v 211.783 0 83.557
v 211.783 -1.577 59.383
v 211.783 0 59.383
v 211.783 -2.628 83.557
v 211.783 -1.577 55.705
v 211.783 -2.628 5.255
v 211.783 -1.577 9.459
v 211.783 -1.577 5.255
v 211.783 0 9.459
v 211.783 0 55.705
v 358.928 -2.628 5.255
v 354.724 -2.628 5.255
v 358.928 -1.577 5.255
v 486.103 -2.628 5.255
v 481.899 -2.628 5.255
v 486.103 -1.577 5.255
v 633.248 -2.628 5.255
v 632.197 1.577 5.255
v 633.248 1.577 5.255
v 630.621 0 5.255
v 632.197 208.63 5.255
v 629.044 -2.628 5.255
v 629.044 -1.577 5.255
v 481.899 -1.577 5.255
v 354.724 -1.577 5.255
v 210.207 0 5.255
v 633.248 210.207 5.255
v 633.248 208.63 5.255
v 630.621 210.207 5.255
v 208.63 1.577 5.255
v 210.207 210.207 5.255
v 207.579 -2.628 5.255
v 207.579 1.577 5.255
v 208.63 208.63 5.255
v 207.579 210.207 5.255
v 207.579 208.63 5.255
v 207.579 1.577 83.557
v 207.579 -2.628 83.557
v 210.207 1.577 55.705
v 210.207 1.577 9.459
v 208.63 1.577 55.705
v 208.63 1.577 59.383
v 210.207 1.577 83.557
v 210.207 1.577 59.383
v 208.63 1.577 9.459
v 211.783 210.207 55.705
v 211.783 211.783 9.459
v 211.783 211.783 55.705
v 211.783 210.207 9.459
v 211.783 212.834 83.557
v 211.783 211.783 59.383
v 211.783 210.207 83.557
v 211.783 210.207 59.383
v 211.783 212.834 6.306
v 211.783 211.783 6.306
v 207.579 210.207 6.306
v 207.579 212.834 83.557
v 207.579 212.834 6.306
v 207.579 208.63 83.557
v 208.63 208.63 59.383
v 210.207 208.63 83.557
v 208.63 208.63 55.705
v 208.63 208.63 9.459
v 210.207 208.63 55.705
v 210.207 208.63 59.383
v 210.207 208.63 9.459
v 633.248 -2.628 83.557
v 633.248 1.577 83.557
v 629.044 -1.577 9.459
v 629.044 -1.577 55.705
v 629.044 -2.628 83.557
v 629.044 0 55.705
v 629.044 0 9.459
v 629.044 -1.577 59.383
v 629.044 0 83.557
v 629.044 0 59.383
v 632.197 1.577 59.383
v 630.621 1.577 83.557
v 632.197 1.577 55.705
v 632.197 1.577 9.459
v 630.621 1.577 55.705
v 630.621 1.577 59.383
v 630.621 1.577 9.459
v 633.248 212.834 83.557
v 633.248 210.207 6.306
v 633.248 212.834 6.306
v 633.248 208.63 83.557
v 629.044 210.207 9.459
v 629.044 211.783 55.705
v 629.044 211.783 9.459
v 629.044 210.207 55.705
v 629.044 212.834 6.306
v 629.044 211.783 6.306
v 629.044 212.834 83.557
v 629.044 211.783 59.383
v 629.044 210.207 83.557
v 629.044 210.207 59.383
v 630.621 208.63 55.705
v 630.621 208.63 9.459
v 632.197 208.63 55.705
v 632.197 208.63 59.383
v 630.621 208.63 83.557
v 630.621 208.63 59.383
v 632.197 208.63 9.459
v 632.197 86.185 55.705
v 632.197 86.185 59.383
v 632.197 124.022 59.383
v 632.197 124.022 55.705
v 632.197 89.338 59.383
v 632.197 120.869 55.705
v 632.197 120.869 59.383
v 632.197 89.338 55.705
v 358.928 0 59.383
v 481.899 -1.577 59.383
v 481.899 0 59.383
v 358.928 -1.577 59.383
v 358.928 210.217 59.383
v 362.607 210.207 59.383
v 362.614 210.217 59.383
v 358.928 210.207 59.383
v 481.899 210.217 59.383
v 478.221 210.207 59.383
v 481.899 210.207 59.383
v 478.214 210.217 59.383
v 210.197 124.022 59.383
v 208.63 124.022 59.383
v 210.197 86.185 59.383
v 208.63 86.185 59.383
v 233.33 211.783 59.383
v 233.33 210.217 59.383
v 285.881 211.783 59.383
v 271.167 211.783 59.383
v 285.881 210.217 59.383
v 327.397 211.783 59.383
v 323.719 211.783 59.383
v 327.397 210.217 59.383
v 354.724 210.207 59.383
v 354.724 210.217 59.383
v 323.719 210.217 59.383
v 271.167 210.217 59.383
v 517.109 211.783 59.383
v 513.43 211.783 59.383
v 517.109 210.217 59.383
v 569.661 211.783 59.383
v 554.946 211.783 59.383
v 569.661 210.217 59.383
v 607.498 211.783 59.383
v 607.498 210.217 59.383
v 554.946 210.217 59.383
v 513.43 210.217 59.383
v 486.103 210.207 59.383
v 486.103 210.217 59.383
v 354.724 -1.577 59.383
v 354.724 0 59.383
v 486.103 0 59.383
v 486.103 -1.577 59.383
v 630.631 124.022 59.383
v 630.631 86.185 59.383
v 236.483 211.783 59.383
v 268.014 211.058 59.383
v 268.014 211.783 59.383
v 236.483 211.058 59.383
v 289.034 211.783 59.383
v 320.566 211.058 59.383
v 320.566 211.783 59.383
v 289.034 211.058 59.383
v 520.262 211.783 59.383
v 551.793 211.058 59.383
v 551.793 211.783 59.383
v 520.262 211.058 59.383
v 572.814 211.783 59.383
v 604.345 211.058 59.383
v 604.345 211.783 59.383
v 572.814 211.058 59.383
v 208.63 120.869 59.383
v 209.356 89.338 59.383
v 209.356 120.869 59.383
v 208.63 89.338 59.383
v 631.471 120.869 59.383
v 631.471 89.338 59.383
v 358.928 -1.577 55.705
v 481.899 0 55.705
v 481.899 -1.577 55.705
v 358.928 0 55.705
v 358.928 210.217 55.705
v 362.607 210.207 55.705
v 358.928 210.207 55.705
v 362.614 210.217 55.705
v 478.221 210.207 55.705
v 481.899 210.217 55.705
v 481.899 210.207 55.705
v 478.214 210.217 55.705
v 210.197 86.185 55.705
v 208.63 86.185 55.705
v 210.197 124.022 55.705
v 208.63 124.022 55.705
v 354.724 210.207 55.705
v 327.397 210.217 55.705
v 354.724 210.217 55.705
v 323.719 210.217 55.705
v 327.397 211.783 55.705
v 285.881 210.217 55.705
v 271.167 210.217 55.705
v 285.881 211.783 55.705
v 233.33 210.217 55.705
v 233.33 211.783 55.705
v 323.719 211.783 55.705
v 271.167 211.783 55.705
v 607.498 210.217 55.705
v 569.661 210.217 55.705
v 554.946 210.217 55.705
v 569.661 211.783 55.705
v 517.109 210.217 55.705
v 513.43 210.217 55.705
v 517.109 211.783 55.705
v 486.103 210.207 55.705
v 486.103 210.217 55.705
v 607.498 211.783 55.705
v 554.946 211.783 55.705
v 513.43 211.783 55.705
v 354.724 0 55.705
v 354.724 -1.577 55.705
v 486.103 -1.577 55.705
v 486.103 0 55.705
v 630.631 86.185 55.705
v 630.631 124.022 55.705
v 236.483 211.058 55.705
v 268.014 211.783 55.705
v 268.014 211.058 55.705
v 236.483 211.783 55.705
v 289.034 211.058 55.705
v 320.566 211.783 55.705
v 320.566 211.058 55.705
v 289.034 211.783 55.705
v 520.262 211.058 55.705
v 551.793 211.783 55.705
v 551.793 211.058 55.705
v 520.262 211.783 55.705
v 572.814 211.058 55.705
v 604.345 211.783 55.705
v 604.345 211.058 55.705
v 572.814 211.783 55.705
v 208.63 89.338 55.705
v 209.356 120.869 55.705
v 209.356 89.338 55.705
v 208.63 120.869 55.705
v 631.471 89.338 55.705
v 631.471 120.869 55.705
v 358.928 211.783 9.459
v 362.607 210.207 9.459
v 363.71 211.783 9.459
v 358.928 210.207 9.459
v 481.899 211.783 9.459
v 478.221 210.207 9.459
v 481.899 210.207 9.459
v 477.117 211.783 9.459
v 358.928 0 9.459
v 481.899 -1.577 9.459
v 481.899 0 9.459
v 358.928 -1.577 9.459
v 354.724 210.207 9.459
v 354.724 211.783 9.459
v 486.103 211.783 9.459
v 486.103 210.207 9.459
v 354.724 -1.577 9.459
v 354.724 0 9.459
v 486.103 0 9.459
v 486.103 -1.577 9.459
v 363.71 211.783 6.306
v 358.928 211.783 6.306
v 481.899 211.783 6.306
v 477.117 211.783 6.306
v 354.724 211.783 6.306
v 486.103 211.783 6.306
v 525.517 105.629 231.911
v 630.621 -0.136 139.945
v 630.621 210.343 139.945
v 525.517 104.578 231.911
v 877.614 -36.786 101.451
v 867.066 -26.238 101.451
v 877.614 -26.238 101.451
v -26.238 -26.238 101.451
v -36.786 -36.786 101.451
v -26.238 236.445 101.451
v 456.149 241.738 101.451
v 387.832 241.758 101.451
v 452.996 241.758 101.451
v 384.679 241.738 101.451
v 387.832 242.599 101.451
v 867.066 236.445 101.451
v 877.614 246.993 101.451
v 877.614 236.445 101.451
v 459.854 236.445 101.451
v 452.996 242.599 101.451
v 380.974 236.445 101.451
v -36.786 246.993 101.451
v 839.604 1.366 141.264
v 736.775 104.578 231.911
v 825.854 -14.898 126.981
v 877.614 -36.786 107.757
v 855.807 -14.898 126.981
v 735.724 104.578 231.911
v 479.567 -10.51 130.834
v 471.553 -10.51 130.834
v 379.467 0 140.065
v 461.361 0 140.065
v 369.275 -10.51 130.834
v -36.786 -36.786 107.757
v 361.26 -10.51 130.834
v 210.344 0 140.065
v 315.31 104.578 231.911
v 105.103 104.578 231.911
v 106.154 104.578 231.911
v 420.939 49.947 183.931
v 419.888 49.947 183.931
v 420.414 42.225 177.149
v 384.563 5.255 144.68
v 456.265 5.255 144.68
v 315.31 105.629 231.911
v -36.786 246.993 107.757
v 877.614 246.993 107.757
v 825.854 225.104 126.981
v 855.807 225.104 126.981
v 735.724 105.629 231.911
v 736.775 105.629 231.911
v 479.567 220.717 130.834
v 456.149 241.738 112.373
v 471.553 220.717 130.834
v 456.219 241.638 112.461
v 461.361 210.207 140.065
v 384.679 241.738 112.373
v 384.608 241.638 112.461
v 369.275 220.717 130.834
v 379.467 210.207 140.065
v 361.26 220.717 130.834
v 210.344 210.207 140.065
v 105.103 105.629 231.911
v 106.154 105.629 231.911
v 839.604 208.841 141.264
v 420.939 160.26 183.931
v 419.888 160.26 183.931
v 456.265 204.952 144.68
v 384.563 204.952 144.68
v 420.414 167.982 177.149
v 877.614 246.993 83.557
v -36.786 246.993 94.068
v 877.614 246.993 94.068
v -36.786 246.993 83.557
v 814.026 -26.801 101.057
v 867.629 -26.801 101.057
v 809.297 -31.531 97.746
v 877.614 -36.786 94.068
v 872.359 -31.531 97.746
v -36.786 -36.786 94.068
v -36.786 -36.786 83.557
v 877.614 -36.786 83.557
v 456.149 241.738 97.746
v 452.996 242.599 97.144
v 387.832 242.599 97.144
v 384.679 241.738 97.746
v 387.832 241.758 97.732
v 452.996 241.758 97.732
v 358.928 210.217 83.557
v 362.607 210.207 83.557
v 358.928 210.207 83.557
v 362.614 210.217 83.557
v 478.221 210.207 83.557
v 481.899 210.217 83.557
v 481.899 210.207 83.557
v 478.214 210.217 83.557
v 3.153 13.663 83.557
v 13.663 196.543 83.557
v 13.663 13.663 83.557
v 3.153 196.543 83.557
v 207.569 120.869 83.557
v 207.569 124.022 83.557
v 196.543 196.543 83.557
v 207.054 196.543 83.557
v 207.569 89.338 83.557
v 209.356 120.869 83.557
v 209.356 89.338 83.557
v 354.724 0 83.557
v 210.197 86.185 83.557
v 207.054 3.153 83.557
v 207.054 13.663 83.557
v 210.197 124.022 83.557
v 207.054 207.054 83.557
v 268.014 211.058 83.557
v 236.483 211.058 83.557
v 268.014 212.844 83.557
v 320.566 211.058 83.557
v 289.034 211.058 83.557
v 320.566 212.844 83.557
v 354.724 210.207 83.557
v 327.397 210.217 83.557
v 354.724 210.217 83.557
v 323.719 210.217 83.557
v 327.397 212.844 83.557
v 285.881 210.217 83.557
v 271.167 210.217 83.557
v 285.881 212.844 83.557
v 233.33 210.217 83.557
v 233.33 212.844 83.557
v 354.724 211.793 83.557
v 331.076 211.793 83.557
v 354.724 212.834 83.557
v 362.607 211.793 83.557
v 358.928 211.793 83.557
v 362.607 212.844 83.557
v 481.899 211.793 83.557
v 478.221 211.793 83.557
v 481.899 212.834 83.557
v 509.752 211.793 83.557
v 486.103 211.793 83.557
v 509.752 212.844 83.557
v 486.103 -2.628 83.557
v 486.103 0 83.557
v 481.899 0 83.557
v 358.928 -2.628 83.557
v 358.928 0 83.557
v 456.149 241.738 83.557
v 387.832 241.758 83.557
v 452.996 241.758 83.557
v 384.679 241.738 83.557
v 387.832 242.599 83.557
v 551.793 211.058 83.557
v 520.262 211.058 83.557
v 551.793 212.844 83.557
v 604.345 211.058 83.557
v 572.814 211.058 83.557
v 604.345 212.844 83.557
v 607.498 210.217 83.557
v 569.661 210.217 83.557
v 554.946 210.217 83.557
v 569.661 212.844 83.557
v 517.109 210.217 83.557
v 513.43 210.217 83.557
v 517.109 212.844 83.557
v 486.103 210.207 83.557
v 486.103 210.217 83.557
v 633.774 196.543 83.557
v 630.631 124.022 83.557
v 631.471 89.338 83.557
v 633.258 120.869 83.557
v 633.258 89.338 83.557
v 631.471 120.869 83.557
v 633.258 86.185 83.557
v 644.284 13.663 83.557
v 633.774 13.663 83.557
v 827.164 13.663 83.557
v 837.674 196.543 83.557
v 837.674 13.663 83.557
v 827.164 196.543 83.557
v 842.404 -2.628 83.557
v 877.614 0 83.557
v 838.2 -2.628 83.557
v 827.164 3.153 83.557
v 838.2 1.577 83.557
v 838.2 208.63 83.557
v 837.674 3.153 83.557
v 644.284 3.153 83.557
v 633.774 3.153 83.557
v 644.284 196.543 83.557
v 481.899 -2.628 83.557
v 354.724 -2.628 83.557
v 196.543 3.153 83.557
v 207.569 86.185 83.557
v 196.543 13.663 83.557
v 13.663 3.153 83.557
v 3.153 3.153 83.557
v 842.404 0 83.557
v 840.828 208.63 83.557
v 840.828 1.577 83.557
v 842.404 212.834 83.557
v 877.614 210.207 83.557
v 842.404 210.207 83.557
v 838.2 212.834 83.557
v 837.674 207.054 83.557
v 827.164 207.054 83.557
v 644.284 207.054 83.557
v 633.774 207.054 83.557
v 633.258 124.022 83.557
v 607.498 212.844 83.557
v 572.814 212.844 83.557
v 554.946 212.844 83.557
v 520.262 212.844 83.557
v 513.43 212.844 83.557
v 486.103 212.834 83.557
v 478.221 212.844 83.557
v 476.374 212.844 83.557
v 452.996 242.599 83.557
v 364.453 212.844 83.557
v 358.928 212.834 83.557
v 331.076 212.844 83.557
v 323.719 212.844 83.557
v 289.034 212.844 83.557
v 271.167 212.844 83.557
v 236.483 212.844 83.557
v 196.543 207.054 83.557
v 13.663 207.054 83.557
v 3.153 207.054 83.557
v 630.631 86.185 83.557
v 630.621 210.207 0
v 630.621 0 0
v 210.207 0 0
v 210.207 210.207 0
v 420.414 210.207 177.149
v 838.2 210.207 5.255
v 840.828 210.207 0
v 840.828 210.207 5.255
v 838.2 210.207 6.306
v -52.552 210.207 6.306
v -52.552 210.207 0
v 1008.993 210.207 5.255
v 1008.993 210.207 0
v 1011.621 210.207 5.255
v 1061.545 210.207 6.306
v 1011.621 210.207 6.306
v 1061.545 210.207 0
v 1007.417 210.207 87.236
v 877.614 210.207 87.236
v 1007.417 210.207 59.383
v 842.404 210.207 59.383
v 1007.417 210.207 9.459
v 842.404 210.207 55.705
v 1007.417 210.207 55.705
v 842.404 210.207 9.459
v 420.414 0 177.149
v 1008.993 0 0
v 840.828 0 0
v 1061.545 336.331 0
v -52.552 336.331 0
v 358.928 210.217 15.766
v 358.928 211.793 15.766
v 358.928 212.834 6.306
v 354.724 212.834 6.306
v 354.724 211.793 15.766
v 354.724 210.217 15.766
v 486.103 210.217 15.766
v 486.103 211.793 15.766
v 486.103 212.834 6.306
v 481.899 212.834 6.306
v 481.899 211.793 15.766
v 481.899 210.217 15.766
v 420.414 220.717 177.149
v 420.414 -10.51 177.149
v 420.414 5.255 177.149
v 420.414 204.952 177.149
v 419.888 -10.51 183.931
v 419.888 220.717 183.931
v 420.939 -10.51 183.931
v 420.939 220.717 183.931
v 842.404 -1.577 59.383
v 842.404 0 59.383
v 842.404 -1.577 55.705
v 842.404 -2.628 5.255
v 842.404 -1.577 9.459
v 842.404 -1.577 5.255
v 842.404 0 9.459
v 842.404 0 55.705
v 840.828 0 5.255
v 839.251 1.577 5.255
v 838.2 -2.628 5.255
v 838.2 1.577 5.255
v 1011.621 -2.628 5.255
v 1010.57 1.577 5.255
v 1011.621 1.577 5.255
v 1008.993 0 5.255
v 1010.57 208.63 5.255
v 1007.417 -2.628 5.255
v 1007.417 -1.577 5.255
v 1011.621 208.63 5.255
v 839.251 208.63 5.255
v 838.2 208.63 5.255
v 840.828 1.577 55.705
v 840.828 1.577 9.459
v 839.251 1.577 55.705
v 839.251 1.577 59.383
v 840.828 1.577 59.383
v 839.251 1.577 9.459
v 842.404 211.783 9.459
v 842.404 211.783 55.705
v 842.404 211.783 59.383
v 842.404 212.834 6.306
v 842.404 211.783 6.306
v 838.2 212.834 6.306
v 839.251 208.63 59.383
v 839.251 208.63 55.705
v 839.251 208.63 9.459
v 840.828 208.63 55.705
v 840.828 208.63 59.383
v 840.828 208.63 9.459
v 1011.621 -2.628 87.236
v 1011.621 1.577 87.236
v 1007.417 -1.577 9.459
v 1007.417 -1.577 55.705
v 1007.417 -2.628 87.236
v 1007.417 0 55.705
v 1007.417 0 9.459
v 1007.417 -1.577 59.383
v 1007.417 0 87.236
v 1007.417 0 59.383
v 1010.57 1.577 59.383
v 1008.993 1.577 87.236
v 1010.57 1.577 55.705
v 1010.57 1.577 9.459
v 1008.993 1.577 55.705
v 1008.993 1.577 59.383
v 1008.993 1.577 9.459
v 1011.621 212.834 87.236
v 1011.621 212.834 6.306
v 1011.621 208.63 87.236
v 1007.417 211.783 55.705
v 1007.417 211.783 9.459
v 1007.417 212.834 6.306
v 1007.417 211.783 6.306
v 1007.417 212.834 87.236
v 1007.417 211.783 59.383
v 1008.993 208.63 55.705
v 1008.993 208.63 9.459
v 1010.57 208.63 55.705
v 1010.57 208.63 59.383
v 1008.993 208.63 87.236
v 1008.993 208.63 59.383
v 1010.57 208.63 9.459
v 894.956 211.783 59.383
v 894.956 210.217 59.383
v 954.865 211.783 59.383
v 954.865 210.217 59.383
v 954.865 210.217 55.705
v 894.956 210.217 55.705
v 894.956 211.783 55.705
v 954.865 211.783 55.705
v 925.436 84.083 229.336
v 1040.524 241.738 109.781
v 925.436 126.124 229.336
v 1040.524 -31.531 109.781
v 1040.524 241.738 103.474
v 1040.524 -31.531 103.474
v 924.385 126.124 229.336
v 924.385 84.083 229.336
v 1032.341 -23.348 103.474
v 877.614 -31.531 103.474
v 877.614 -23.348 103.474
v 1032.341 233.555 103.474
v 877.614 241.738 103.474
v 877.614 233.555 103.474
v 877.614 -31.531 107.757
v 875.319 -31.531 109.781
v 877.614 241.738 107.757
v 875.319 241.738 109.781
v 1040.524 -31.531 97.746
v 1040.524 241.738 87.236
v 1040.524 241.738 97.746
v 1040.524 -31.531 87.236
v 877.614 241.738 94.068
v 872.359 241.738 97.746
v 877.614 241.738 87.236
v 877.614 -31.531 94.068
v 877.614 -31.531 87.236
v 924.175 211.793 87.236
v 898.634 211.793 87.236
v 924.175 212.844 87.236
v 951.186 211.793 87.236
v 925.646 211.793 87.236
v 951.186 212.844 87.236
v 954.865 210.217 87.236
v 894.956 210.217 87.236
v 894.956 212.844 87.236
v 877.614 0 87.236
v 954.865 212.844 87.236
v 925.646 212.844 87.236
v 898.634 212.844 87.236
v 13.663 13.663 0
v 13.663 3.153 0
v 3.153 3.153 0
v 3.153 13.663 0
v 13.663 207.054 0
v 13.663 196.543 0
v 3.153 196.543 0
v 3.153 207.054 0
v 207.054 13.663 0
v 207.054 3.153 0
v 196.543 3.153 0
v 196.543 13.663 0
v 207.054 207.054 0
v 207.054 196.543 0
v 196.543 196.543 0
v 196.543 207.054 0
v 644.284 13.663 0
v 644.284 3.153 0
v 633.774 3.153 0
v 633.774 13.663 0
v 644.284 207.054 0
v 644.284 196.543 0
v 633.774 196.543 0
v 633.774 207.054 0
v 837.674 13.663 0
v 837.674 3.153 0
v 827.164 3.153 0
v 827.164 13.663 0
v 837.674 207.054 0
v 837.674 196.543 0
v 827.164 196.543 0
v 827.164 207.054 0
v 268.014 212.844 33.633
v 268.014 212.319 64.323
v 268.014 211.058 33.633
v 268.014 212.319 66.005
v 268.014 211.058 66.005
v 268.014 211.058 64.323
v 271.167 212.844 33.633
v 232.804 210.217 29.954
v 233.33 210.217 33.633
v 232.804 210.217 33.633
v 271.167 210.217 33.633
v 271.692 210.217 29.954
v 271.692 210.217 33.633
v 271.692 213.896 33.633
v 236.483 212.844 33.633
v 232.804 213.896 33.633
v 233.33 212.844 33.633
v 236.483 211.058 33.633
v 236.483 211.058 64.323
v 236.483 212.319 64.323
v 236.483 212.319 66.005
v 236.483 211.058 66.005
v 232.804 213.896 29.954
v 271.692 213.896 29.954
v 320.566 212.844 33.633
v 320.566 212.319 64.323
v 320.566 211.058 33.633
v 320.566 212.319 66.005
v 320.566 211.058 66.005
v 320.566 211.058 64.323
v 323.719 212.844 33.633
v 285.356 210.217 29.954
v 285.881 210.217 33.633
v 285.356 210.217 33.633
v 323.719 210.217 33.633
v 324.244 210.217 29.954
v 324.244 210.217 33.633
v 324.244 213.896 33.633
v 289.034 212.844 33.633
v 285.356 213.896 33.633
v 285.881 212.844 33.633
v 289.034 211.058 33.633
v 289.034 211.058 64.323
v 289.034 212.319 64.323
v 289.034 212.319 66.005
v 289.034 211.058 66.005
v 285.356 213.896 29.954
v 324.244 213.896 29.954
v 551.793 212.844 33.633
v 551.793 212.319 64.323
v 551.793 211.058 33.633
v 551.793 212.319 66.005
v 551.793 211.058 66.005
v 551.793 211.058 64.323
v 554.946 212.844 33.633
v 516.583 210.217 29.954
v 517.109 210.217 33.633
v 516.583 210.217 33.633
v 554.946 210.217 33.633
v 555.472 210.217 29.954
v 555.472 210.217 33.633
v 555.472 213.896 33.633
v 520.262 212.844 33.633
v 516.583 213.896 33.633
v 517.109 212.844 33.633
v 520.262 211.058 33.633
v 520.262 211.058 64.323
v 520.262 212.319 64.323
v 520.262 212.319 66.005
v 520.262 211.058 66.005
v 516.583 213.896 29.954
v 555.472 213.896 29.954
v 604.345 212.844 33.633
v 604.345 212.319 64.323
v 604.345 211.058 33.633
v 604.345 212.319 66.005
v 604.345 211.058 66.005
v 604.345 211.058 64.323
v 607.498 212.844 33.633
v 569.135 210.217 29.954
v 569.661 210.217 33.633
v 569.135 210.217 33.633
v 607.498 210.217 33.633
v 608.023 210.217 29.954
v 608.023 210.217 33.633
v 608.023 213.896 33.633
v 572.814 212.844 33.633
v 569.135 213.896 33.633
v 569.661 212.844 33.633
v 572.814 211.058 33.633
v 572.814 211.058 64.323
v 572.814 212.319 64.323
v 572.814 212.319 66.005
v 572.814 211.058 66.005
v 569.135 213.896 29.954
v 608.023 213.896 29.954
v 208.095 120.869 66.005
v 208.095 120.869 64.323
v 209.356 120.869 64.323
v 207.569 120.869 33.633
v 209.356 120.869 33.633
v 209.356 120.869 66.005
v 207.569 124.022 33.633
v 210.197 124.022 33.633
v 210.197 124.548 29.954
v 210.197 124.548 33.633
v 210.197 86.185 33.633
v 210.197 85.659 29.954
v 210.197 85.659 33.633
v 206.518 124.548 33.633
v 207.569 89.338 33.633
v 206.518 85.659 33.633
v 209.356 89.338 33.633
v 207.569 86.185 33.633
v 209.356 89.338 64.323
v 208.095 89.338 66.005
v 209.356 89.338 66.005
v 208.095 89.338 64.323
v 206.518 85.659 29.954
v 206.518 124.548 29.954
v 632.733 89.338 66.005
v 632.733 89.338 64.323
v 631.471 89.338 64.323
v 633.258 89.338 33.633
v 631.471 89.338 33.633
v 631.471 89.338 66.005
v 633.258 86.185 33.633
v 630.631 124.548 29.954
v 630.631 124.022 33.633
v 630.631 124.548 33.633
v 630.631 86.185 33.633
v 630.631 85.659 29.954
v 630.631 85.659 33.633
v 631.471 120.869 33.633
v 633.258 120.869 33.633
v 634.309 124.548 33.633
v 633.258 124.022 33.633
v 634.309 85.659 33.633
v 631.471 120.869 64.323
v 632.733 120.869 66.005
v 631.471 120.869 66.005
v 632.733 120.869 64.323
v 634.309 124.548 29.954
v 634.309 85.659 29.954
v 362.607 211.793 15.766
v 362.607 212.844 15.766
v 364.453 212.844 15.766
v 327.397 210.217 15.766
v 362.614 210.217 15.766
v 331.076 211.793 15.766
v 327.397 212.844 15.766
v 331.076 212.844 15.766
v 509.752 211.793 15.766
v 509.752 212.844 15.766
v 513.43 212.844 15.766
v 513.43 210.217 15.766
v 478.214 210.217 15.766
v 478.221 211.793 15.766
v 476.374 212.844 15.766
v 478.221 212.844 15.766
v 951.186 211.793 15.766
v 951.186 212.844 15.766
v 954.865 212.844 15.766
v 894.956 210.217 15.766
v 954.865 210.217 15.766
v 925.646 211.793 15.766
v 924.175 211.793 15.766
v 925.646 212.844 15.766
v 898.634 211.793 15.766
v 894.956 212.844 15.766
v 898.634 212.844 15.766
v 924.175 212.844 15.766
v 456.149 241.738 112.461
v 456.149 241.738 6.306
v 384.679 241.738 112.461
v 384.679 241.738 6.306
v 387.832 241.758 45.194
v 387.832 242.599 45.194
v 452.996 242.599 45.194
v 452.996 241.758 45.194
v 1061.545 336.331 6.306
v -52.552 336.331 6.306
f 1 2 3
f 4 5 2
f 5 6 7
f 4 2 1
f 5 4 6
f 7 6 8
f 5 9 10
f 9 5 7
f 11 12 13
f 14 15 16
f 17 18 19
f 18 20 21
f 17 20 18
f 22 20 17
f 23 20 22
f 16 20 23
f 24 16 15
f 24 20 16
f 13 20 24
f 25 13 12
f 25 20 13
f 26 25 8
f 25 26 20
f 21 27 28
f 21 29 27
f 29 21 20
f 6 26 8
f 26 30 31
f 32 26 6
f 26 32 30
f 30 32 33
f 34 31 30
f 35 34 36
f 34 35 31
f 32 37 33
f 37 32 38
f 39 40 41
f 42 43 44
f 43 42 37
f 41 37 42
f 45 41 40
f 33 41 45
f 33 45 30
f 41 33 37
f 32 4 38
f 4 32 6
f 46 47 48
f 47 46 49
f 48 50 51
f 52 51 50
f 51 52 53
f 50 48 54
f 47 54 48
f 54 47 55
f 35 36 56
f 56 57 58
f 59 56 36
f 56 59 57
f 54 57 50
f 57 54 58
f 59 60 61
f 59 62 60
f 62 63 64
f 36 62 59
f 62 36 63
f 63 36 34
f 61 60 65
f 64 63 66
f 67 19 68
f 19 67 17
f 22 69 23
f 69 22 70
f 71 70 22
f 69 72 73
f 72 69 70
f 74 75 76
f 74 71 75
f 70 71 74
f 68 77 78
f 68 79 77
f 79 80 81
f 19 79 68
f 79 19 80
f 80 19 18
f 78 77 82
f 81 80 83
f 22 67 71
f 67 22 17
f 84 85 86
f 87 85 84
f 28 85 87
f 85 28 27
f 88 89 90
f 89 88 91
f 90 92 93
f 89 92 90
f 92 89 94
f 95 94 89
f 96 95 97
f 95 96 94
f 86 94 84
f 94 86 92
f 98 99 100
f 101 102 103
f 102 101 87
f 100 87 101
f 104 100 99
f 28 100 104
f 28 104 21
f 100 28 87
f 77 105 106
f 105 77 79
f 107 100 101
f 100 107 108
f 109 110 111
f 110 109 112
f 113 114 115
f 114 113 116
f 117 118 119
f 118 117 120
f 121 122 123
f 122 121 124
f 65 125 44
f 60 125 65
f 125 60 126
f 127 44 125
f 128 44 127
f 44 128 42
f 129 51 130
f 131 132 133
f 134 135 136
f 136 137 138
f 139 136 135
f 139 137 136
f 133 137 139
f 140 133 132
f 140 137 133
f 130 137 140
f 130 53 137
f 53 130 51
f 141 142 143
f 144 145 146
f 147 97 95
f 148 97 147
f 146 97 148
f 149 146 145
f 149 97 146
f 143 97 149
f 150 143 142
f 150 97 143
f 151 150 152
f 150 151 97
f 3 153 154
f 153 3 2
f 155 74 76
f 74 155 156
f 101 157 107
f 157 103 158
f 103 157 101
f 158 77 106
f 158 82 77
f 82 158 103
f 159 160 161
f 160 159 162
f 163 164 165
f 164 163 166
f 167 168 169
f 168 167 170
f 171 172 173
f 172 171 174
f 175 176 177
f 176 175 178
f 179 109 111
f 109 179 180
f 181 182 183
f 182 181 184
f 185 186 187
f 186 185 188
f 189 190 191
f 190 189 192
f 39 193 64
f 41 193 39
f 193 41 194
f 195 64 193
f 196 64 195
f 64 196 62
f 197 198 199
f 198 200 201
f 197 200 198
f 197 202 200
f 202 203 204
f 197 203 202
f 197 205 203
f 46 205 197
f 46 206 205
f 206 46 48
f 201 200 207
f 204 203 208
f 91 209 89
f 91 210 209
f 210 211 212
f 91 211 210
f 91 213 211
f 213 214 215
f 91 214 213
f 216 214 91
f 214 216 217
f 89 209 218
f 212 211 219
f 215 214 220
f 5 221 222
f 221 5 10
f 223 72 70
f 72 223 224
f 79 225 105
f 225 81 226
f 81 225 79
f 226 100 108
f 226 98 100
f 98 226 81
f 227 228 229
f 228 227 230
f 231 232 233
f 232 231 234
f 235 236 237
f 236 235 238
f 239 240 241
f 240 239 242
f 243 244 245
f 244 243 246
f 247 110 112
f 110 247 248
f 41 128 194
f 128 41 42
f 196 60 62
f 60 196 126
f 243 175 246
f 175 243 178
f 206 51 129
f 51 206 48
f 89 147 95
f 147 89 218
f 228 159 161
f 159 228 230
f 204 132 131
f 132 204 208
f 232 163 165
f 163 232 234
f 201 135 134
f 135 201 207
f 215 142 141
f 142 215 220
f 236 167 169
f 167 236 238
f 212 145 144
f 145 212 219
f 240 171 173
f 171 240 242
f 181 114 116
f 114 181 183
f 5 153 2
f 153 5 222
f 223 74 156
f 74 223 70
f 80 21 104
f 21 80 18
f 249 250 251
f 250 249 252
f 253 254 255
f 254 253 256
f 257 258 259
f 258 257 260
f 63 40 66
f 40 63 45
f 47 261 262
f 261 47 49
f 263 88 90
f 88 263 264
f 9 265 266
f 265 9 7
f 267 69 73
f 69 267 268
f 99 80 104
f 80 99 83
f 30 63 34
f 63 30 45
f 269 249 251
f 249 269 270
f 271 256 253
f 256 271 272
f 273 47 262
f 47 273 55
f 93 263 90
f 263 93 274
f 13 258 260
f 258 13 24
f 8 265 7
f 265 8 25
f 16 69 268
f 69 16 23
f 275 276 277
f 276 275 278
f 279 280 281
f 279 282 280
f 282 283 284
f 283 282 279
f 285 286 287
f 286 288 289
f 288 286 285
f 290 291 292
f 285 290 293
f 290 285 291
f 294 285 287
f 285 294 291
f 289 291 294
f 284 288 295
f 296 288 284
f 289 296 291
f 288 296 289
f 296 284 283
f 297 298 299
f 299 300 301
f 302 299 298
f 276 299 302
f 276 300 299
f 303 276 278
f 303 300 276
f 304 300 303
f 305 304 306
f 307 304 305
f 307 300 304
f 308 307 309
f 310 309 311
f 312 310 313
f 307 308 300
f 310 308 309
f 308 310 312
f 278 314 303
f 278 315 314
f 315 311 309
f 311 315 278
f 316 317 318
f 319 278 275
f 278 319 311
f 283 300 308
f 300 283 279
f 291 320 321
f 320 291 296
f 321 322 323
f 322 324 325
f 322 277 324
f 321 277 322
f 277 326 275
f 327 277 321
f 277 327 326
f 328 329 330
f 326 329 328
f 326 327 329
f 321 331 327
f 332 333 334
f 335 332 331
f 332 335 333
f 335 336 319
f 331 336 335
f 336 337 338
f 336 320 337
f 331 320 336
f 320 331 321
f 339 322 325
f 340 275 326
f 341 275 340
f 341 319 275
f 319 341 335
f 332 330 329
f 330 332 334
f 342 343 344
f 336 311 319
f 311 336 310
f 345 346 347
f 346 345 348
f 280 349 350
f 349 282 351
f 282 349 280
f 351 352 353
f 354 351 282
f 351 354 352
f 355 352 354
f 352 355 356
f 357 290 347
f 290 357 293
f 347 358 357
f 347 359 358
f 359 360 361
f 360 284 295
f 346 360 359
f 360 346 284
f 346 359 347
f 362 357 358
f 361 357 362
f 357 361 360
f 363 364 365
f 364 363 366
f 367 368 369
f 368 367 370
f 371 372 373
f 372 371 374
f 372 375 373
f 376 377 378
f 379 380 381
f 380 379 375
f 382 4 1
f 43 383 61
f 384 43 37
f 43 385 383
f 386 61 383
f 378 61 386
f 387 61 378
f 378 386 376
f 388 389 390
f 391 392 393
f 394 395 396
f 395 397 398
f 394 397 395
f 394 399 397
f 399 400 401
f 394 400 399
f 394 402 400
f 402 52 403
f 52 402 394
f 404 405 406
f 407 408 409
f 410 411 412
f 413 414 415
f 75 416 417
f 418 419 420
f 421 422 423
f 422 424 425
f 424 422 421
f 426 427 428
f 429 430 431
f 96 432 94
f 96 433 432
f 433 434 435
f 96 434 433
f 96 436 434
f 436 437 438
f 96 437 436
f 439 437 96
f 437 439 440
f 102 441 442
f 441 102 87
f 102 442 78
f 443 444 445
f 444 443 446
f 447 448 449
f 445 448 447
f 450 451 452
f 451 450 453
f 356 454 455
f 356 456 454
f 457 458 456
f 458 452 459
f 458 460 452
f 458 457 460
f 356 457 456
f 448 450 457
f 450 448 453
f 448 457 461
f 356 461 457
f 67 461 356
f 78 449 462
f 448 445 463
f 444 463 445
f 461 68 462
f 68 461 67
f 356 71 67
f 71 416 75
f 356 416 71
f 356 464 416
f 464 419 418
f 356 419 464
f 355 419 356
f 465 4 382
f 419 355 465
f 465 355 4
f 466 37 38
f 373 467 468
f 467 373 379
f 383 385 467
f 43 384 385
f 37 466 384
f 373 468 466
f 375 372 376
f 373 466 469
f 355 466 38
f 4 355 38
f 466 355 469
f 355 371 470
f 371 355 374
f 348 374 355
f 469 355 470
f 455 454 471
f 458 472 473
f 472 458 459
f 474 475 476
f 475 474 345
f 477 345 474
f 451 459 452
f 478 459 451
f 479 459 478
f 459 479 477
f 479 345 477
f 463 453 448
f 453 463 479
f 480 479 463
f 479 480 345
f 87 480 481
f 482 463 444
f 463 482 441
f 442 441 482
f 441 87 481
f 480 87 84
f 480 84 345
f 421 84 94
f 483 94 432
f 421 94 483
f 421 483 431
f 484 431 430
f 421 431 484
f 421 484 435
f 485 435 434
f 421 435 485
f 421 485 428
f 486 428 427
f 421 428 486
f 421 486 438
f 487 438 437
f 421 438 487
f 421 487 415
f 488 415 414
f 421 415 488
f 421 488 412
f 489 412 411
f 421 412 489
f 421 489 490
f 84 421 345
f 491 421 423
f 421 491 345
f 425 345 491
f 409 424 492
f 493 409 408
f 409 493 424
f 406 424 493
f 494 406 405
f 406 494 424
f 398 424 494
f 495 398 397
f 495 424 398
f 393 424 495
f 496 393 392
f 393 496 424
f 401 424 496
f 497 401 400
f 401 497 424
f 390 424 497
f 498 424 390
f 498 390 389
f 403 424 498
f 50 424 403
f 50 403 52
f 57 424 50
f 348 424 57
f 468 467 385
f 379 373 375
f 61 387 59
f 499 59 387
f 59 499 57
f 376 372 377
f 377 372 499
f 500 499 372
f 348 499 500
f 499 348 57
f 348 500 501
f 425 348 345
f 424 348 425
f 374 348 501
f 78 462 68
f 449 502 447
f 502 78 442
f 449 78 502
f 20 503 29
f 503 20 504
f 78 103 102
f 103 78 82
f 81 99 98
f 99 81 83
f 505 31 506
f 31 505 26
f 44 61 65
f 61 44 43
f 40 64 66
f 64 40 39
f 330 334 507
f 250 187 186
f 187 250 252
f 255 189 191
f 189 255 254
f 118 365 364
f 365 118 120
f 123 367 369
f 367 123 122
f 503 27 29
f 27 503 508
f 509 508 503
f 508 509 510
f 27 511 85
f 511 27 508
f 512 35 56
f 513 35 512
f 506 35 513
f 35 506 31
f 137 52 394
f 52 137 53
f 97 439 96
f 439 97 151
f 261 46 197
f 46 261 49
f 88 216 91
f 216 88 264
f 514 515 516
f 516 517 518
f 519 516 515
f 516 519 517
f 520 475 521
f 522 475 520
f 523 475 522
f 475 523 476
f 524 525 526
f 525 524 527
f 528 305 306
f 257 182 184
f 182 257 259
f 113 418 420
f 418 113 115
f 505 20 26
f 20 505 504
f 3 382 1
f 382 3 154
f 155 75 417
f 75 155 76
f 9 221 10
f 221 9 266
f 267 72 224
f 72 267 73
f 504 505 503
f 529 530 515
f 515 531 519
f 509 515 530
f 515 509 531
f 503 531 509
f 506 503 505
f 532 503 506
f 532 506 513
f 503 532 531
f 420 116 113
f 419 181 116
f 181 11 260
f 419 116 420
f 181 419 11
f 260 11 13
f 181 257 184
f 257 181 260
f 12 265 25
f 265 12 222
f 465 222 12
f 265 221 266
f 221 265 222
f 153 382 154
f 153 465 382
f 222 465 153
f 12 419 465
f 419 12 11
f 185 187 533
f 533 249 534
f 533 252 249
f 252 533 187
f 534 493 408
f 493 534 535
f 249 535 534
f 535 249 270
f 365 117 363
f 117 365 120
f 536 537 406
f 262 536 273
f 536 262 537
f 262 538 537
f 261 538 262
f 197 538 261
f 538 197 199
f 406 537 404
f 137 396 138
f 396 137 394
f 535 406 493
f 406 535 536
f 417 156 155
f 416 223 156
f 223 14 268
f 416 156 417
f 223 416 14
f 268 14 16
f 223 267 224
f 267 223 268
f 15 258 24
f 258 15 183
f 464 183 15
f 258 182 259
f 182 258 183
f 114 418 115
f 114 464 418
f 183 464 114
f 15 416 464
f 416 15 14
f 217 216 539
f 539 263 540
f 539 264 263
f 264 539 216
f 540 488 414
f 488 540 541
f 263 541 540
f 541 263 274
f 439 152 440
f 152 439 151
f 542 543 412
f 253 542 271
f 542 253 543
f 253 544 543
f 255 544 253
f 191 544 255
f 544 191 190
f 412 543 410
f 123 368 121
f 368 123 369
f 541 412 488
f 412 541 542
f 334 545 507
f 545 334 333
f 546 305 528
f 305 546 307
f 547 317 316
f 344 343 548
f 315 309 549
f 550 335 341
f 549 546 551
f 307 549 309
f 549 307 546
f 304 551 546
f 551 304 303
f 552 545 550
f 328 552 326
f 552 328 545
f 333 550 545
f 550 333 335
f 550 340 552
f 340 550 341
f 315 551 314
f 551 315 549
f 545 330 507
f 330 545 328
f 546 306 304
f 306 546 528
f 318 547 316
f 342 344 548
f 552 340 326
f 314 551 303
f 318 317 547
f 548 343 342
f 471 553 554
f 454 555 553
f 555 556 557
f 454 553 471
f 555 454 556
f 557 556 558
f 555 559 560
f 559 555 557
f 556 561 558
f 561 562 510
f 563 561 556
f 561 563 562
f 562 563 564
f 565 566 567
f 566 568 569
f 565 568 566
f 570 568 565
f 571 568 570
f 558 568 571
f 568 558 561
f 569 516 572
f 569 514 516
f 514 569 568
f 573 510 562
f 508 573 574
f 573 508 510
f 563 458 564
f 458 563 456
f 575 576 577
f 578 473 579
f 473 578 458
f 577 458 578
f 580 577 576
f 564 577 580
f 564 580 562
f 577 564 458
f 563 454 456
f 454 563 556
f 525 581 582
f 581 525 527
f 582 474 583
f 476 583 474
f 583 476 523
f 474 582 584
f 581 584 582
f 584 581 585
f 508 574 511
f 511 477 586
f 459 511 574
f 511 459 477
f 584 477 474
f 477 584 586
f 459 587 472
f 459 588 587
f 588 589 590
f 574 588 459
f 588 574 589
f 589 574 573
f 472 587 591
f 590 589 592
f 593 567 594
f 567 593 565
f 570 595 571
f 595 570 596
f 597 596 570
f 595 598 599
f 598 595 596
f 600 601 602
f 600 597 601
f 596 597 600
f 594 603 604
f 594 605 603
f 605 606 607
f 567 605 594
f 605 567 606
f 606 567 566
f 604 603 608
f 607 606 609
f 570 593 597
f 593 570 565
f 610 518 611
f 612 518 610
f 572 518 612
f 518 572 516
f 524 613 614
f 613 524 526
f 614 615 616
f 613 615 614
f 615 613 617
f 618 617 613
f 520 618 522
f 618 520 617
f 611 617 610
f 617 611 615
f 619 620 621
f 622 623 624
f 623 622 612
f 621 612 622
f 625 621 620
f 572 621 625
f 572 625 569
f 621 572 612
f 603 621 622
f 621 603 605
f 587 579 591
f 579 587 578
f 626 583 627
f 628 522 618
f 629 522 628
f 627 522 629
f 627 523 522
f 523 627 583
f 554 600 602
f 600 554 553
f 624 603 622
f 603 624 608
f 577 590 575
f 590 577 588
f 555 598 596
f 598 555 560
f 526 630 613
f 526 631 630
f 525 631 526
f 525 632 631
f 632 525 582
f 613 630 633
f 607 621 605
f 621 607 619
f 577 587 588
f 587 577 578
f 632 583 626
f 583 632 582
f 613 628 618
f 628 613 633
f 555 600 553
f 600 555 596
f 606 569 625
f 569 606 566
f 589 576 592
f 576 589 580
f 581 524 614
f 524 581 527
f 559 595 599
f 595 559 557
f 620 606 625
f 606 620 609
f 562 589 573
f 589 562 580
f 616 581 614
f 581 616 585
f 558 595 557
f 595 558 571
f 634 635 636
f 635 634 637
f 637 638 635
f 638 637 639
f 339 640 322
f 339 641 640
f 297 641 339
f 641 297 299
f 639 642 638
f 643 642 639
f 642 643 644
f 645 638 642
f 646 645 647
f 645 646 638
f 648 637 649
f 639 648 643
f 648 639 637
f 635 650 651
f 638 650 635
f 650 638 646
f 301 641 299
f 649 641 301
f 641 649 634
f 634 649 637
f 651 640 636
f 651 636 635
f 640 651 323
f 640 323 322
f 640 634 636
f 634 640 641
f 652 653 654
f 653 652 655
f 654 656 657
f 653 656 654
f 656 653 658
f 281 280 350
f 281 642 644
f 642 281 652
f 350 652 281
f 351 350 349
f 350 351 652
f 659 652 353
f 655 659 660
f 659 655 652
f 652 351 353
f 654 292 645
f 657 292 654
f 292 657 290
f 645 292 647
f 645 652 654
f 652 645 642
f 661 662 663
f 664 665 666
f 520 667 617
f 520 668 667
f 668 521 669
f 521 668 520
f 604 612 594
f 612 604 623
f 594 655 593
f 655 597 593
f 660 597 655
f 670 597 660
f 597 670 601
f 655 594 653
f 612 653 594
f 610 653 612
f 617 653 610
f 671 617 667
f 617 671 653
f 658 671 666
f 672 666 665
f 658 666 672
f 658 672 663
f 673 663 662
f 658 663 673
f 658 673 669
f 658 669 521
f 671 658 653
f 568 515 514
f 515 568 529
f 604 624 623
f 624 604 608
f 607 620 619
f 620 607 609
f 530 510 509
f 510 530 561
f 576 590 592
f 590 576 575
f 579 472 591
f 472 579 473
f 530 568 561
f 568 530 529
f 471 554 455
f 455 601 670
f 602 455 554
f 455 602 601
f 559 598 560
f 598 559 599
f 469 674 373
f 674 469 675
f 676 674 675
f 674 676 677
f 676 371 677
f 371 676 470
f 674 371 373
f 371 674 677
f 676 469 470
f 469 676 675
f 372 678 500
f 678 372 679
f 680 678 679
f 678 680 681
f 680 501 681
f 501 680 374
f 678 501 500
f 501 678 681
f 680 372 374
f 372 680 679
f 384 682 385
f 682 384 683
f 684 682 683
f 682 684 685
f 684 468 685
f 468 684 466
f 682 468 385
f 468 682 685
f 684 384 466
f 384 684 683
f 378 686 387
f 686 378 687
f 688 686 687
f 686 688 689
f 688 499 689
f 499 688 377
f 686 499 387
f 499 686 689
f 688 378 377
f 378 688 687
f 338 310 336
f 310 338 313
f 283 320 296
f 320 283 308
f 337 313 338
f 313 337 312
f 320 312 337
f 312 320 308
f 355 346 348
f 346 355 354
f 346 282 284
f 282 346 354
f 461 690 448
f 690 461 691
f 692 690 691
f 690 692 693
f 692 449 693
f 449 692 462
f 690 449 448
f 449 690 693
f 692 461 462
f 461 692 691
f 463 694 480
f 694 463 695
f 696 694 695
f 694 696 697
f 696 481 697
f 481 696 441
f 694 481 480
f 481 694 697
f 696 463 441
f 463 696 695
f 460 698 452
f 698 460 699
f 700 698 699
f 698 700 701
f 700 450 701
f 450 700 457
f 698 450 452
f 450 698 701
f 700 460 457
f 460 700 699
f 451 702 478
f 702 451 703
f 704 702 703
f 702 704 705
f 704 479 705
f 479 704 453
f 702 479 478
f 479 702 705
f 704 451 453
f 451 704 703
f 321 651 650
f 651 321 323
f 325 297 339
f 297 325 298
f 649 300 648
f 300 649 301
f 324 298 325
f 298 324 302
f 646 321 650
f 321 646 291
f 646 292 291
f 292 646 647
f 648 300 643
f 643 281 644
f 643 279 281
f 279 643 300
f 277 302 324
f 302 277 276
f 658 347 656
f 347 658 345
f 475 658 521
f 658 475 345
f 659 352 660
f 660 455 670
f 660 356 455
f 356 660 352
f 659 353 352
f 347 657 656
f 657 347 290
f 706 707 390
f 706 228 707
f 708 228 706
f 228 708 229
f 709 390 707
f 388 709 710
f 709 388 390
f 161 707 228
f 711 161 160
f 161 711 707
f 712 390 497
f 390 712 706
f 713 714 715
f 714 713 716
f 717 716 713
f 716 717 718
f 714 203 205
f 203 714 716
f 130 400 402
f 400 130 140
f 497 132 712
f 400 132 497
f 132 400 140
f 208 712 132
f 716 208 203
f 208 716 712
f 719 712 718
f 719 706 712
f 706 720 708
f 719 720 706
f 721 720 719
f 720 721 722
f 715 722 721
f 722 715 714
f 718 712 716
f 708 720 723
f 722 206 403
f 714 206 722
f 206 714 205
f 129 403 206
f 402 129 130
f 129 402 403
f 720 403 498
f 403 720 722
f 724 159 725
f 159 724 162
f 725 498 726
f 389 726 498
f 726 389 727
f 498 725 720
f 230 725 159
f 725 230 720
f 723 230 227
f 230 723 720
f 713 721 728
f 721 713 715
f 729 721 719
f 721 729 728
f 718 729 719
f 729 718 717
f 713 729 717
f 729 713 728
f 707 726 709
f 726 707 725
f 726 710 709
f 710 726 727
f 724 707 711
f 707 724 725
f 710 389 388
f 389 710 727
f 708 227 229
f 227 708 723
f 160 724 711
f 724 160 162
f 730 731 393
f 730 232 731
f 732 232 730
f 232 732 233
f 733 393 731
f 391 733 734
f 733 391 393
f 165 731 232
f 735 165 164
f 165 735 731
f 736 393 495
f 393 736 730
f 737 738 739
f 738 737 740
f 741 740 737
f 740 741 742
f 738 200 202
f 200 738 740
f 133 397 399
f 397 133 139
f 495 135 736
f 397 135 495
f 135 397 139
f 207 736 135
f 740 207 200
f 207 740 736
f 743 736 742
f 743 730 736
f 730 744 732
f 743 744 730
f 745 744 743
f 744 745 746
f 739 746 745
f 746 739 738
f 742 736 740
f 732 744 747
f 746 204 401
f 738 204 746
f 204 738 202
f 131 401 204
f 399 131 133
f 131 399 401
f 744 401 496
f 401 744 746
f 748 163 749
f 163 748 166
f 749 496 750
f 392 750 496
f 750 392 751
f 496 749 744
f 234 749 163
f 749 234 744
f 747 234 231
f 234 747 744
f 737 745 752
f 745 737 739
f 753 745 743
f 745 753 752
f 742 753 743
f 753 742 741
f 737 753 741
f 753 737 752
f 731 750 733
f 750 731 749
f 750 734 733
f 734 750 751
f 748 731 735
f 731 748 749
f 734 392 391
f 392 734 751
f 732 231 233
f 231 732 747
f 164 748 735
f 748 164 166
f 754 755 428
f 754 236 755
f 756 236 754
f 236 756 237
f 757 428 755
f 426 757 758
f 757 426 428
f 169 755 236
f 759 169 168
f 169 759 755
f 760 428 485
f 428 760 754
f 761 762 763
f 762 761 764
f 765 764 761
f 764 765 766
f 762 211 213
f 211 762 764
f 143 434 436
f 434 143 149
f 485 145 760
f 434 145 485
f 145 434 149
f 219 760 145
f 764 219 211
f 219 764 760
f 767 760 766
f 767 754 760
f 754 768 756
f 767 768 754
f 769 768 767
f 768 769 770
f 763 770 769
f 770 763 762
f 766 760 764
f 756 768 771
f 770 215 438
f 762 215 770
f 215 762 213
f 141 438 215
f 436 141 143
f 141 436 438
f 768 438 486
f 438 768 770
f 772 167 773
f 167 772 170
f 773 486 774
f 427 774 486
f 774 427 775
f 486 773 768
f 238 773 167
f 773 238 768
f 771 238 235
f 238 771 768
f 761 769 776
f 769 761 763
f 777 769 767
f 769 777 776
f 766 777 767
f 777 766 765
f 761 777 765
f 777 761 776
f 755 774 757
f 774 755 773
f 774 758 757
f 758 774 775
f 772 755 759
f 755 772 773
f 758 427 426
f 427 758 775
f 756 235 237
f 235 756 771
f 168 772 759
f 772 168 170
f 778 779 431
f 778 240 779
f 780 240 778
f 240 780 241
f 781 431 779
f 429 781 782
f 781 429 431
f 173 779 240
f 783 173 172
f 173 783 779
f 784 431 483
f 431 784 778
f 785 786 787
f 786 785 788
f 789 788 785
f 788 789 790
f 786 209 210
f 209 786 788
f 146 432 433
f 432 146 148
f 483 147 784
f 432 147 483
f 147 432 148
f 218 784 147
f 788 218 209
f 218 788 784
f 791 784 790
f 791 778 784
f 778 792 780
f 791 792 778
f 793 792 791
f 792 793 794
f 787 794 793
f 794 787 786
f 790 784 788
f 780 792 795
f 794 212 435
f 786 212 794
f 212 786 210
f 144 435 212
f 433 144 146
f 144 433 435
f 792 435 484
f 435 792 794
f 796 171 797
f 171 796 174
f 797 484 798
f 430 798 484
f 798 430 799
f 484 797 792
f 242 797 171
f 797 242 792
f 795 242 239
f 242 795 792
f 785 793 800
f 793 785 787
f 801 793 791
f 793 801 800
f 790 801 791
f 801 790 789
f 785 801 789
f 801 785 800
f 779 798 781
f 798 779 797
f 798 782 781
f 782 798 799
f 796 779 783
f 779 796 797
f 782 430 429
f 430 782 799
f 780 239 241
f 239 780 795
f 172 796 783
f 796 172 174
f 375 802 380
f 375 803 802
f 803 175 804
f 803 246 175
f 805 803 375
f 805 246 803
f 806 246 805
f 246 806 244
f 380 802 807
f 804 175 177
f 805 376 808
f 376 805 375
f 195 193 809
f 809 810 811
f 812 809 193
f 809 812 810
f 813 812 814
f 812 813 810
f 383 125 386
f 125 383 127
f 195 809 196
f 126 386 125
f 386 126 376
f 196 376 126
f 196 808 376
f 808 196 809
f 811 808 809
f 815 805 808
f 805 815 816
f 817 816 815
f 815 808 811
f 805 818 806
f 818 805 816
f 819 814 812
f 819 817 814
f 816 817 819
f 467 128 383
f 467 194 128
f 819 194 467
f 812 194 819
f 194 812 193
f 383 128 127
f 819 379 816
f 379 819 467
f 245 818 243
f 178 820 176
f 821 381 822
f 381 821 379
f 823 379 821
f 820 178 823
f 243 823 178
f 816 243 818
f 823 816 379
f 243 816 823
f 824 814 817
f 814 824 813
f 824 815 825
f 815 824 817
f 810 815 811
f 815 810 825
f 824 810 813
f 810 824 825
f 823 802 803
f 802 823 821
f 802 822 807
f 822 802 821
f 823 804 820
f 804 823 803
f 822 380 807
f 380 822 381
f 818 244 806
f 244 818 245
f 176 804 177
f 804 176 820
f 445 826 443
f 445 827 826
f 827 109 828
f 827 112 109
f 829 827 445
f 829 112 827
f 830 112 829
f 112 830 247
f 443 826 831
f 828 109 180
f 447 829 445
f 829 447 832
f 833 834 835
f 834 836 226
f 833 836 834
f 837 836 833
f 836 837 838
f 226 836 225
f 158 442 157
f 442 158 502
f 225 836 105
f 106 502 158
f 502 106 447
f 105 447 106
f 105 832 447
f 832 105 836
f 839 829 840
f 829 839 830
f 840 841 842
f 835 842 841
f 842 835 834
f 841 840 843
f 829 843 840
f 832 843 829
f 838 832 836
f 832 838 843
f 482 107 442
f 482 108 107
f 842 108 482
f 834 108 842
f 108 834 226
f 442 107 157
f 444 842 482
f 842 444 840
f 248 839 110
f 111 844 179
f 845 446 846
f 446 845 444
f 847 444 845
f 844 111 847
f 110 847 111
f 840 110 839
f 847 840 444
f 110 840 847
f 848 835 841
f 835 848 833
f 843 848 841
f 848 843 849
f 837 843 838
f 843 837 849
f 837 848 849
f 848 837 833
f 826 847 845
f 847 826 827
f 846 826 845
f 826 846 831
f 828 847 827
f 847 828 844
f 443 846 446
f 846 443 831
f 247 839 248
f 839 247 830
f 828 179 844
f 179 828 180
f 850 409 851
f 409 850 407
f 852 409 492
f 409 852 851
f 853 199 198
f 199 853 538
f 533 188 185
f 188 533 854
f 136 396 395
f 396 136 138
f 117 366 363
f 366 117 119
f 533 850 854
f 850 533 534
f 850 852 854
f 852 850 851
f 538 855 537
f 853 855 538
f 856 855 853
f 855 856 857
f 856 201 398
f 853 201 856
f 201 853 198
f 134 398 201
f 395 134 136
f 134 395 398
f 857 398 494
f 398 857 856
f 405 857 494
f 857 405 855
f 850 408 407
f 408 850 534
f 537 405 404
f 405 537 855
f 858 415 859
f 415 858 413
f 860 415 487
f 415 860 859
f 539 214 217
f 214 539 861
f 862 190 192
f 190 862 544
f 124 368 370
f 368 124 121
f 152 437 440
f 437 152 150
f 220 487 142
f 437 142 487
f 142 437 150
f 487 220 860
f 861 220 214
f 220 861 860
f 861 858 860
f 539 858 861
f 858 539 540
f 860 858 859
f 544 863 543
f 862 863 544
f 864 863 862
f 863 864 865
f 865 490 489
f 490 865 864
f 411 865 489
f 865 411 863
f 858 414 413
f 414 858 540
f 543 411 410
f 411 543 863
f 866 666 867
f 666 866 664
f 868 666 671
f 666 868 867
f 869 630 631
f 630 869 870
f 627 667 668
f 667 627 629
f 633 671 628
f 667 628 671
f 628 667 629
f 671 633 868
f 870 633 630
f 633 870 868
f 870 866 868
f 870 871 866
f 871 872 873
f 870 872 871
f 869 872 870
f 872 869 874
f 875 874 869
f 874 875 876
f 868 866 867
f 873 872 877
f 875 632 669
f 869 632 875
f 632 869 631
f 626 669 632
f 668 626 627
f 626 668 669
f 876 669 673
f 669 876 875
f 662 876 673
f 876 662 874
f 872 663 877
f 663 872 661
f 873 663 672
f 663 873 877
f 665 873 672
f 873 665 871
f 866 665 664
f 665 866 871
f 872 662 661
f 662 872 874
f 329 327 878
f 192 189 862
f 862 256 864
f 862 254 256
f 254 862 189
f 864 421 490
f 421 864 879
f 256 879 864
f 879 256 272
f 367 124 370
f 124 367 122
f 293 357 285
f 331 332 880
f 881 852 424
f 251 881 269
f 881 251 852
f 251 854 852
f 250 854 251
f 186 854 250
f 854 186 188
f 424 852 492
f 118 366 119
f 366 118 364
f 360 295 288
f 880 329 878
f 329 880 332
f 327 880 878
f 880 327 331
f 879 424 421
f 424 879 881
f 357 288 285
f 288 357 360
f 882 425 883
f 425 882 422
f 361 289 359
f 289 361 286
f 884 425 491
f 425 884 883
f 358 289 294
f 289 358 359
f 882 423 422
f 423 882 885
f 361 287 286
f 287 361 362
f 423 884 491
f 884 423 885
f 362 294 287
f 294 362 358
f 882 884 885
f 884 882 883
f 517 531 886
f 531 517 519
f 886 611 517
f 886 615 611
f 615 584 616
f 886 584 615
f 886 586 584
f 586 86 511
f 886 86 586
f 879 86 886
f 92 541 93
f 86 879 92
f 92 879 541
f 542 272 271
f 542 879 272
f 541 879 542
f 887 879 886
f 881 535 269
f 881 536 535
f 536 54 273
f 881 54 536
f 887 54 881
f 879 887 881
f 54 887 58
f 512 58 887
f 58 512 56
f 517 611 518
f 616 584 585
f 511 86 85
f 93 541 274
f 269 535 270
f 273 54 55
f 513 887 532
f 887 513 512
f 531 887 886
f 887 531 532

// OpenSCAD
// =====================================================================
//  MILWAUKEE ROAD - STANDARD 20 X 96 FT DEPOT WITH PAVILIONS, GRAYS LAKE (C.M.&ST.P.)
//  Album of Depot Plans (1919), sheet 12. Private reference (in copyright):
//  Research Library / RSW / Stations / Standard depots / Album of Depot Plans 1919.
//  Rib Side Works, 24 Nov 2026. FIRST SHAPE MODEL for review - not cut into print sections.
//  KNOWN (from the sheet): 96 ft overall: pavilion 20 ft, depot 40 x 20 (two waiting rooms 13 ft 6, octagonal office bay 11 ft) with a centre gable, pavilion 20 ft, baggage room 16 ft; flared hipped shingle roofs with cresting.
//  ESTIMATE: wall and ridge heights (sheets are small copies), window spacing, colours.
//  Shared depot builder ../../../_common/rsw_depot.scad (x along the track, y = 0 town side,
//  track side +y, feet).  SCALE: 29 = G, 48 = O, 87 = HO.
// =====================================================================
SCALE = 29;
include <../../../_common/rsw_depot.scad>

depot(blocks = [[20, 40, 0, 20, 11, 0.7, 3, 3.5, 0], [34, 12, 0, 20, 11.5, 0.9, 2, 2, 0], [80, 16, 0, 20, 11, 0.7, 3, 3, 0]],
      pavs   = [[0, 20, 0, 20, 11, 0.7, 3, 3.5, 2, 2], [60, 20, 0, 20, 11, 0.7, 3, 3.5, 2, 2]],
      wins   = [[24, 1, 3, 6, 3.2], [29, 1, 3, 6, 3.2], [51, 1, 3, 6, 3.2], [56, 1, 3, 6, 3.2], [10, 2, 3, 6, 3.2], [10, 3, 3, 6, 3.2]],
      doors  = [[33, 1, 3, 7.5, 0], [47, 1, 3, 7.5, 0], [88, 1, 5, 8, 1, 2]],
      bays   = [[40, 1, 11, 3]],
      chims  = [[30, 10, 21.0]],
      plat   = [-5, 106, 12, 0.6]);
